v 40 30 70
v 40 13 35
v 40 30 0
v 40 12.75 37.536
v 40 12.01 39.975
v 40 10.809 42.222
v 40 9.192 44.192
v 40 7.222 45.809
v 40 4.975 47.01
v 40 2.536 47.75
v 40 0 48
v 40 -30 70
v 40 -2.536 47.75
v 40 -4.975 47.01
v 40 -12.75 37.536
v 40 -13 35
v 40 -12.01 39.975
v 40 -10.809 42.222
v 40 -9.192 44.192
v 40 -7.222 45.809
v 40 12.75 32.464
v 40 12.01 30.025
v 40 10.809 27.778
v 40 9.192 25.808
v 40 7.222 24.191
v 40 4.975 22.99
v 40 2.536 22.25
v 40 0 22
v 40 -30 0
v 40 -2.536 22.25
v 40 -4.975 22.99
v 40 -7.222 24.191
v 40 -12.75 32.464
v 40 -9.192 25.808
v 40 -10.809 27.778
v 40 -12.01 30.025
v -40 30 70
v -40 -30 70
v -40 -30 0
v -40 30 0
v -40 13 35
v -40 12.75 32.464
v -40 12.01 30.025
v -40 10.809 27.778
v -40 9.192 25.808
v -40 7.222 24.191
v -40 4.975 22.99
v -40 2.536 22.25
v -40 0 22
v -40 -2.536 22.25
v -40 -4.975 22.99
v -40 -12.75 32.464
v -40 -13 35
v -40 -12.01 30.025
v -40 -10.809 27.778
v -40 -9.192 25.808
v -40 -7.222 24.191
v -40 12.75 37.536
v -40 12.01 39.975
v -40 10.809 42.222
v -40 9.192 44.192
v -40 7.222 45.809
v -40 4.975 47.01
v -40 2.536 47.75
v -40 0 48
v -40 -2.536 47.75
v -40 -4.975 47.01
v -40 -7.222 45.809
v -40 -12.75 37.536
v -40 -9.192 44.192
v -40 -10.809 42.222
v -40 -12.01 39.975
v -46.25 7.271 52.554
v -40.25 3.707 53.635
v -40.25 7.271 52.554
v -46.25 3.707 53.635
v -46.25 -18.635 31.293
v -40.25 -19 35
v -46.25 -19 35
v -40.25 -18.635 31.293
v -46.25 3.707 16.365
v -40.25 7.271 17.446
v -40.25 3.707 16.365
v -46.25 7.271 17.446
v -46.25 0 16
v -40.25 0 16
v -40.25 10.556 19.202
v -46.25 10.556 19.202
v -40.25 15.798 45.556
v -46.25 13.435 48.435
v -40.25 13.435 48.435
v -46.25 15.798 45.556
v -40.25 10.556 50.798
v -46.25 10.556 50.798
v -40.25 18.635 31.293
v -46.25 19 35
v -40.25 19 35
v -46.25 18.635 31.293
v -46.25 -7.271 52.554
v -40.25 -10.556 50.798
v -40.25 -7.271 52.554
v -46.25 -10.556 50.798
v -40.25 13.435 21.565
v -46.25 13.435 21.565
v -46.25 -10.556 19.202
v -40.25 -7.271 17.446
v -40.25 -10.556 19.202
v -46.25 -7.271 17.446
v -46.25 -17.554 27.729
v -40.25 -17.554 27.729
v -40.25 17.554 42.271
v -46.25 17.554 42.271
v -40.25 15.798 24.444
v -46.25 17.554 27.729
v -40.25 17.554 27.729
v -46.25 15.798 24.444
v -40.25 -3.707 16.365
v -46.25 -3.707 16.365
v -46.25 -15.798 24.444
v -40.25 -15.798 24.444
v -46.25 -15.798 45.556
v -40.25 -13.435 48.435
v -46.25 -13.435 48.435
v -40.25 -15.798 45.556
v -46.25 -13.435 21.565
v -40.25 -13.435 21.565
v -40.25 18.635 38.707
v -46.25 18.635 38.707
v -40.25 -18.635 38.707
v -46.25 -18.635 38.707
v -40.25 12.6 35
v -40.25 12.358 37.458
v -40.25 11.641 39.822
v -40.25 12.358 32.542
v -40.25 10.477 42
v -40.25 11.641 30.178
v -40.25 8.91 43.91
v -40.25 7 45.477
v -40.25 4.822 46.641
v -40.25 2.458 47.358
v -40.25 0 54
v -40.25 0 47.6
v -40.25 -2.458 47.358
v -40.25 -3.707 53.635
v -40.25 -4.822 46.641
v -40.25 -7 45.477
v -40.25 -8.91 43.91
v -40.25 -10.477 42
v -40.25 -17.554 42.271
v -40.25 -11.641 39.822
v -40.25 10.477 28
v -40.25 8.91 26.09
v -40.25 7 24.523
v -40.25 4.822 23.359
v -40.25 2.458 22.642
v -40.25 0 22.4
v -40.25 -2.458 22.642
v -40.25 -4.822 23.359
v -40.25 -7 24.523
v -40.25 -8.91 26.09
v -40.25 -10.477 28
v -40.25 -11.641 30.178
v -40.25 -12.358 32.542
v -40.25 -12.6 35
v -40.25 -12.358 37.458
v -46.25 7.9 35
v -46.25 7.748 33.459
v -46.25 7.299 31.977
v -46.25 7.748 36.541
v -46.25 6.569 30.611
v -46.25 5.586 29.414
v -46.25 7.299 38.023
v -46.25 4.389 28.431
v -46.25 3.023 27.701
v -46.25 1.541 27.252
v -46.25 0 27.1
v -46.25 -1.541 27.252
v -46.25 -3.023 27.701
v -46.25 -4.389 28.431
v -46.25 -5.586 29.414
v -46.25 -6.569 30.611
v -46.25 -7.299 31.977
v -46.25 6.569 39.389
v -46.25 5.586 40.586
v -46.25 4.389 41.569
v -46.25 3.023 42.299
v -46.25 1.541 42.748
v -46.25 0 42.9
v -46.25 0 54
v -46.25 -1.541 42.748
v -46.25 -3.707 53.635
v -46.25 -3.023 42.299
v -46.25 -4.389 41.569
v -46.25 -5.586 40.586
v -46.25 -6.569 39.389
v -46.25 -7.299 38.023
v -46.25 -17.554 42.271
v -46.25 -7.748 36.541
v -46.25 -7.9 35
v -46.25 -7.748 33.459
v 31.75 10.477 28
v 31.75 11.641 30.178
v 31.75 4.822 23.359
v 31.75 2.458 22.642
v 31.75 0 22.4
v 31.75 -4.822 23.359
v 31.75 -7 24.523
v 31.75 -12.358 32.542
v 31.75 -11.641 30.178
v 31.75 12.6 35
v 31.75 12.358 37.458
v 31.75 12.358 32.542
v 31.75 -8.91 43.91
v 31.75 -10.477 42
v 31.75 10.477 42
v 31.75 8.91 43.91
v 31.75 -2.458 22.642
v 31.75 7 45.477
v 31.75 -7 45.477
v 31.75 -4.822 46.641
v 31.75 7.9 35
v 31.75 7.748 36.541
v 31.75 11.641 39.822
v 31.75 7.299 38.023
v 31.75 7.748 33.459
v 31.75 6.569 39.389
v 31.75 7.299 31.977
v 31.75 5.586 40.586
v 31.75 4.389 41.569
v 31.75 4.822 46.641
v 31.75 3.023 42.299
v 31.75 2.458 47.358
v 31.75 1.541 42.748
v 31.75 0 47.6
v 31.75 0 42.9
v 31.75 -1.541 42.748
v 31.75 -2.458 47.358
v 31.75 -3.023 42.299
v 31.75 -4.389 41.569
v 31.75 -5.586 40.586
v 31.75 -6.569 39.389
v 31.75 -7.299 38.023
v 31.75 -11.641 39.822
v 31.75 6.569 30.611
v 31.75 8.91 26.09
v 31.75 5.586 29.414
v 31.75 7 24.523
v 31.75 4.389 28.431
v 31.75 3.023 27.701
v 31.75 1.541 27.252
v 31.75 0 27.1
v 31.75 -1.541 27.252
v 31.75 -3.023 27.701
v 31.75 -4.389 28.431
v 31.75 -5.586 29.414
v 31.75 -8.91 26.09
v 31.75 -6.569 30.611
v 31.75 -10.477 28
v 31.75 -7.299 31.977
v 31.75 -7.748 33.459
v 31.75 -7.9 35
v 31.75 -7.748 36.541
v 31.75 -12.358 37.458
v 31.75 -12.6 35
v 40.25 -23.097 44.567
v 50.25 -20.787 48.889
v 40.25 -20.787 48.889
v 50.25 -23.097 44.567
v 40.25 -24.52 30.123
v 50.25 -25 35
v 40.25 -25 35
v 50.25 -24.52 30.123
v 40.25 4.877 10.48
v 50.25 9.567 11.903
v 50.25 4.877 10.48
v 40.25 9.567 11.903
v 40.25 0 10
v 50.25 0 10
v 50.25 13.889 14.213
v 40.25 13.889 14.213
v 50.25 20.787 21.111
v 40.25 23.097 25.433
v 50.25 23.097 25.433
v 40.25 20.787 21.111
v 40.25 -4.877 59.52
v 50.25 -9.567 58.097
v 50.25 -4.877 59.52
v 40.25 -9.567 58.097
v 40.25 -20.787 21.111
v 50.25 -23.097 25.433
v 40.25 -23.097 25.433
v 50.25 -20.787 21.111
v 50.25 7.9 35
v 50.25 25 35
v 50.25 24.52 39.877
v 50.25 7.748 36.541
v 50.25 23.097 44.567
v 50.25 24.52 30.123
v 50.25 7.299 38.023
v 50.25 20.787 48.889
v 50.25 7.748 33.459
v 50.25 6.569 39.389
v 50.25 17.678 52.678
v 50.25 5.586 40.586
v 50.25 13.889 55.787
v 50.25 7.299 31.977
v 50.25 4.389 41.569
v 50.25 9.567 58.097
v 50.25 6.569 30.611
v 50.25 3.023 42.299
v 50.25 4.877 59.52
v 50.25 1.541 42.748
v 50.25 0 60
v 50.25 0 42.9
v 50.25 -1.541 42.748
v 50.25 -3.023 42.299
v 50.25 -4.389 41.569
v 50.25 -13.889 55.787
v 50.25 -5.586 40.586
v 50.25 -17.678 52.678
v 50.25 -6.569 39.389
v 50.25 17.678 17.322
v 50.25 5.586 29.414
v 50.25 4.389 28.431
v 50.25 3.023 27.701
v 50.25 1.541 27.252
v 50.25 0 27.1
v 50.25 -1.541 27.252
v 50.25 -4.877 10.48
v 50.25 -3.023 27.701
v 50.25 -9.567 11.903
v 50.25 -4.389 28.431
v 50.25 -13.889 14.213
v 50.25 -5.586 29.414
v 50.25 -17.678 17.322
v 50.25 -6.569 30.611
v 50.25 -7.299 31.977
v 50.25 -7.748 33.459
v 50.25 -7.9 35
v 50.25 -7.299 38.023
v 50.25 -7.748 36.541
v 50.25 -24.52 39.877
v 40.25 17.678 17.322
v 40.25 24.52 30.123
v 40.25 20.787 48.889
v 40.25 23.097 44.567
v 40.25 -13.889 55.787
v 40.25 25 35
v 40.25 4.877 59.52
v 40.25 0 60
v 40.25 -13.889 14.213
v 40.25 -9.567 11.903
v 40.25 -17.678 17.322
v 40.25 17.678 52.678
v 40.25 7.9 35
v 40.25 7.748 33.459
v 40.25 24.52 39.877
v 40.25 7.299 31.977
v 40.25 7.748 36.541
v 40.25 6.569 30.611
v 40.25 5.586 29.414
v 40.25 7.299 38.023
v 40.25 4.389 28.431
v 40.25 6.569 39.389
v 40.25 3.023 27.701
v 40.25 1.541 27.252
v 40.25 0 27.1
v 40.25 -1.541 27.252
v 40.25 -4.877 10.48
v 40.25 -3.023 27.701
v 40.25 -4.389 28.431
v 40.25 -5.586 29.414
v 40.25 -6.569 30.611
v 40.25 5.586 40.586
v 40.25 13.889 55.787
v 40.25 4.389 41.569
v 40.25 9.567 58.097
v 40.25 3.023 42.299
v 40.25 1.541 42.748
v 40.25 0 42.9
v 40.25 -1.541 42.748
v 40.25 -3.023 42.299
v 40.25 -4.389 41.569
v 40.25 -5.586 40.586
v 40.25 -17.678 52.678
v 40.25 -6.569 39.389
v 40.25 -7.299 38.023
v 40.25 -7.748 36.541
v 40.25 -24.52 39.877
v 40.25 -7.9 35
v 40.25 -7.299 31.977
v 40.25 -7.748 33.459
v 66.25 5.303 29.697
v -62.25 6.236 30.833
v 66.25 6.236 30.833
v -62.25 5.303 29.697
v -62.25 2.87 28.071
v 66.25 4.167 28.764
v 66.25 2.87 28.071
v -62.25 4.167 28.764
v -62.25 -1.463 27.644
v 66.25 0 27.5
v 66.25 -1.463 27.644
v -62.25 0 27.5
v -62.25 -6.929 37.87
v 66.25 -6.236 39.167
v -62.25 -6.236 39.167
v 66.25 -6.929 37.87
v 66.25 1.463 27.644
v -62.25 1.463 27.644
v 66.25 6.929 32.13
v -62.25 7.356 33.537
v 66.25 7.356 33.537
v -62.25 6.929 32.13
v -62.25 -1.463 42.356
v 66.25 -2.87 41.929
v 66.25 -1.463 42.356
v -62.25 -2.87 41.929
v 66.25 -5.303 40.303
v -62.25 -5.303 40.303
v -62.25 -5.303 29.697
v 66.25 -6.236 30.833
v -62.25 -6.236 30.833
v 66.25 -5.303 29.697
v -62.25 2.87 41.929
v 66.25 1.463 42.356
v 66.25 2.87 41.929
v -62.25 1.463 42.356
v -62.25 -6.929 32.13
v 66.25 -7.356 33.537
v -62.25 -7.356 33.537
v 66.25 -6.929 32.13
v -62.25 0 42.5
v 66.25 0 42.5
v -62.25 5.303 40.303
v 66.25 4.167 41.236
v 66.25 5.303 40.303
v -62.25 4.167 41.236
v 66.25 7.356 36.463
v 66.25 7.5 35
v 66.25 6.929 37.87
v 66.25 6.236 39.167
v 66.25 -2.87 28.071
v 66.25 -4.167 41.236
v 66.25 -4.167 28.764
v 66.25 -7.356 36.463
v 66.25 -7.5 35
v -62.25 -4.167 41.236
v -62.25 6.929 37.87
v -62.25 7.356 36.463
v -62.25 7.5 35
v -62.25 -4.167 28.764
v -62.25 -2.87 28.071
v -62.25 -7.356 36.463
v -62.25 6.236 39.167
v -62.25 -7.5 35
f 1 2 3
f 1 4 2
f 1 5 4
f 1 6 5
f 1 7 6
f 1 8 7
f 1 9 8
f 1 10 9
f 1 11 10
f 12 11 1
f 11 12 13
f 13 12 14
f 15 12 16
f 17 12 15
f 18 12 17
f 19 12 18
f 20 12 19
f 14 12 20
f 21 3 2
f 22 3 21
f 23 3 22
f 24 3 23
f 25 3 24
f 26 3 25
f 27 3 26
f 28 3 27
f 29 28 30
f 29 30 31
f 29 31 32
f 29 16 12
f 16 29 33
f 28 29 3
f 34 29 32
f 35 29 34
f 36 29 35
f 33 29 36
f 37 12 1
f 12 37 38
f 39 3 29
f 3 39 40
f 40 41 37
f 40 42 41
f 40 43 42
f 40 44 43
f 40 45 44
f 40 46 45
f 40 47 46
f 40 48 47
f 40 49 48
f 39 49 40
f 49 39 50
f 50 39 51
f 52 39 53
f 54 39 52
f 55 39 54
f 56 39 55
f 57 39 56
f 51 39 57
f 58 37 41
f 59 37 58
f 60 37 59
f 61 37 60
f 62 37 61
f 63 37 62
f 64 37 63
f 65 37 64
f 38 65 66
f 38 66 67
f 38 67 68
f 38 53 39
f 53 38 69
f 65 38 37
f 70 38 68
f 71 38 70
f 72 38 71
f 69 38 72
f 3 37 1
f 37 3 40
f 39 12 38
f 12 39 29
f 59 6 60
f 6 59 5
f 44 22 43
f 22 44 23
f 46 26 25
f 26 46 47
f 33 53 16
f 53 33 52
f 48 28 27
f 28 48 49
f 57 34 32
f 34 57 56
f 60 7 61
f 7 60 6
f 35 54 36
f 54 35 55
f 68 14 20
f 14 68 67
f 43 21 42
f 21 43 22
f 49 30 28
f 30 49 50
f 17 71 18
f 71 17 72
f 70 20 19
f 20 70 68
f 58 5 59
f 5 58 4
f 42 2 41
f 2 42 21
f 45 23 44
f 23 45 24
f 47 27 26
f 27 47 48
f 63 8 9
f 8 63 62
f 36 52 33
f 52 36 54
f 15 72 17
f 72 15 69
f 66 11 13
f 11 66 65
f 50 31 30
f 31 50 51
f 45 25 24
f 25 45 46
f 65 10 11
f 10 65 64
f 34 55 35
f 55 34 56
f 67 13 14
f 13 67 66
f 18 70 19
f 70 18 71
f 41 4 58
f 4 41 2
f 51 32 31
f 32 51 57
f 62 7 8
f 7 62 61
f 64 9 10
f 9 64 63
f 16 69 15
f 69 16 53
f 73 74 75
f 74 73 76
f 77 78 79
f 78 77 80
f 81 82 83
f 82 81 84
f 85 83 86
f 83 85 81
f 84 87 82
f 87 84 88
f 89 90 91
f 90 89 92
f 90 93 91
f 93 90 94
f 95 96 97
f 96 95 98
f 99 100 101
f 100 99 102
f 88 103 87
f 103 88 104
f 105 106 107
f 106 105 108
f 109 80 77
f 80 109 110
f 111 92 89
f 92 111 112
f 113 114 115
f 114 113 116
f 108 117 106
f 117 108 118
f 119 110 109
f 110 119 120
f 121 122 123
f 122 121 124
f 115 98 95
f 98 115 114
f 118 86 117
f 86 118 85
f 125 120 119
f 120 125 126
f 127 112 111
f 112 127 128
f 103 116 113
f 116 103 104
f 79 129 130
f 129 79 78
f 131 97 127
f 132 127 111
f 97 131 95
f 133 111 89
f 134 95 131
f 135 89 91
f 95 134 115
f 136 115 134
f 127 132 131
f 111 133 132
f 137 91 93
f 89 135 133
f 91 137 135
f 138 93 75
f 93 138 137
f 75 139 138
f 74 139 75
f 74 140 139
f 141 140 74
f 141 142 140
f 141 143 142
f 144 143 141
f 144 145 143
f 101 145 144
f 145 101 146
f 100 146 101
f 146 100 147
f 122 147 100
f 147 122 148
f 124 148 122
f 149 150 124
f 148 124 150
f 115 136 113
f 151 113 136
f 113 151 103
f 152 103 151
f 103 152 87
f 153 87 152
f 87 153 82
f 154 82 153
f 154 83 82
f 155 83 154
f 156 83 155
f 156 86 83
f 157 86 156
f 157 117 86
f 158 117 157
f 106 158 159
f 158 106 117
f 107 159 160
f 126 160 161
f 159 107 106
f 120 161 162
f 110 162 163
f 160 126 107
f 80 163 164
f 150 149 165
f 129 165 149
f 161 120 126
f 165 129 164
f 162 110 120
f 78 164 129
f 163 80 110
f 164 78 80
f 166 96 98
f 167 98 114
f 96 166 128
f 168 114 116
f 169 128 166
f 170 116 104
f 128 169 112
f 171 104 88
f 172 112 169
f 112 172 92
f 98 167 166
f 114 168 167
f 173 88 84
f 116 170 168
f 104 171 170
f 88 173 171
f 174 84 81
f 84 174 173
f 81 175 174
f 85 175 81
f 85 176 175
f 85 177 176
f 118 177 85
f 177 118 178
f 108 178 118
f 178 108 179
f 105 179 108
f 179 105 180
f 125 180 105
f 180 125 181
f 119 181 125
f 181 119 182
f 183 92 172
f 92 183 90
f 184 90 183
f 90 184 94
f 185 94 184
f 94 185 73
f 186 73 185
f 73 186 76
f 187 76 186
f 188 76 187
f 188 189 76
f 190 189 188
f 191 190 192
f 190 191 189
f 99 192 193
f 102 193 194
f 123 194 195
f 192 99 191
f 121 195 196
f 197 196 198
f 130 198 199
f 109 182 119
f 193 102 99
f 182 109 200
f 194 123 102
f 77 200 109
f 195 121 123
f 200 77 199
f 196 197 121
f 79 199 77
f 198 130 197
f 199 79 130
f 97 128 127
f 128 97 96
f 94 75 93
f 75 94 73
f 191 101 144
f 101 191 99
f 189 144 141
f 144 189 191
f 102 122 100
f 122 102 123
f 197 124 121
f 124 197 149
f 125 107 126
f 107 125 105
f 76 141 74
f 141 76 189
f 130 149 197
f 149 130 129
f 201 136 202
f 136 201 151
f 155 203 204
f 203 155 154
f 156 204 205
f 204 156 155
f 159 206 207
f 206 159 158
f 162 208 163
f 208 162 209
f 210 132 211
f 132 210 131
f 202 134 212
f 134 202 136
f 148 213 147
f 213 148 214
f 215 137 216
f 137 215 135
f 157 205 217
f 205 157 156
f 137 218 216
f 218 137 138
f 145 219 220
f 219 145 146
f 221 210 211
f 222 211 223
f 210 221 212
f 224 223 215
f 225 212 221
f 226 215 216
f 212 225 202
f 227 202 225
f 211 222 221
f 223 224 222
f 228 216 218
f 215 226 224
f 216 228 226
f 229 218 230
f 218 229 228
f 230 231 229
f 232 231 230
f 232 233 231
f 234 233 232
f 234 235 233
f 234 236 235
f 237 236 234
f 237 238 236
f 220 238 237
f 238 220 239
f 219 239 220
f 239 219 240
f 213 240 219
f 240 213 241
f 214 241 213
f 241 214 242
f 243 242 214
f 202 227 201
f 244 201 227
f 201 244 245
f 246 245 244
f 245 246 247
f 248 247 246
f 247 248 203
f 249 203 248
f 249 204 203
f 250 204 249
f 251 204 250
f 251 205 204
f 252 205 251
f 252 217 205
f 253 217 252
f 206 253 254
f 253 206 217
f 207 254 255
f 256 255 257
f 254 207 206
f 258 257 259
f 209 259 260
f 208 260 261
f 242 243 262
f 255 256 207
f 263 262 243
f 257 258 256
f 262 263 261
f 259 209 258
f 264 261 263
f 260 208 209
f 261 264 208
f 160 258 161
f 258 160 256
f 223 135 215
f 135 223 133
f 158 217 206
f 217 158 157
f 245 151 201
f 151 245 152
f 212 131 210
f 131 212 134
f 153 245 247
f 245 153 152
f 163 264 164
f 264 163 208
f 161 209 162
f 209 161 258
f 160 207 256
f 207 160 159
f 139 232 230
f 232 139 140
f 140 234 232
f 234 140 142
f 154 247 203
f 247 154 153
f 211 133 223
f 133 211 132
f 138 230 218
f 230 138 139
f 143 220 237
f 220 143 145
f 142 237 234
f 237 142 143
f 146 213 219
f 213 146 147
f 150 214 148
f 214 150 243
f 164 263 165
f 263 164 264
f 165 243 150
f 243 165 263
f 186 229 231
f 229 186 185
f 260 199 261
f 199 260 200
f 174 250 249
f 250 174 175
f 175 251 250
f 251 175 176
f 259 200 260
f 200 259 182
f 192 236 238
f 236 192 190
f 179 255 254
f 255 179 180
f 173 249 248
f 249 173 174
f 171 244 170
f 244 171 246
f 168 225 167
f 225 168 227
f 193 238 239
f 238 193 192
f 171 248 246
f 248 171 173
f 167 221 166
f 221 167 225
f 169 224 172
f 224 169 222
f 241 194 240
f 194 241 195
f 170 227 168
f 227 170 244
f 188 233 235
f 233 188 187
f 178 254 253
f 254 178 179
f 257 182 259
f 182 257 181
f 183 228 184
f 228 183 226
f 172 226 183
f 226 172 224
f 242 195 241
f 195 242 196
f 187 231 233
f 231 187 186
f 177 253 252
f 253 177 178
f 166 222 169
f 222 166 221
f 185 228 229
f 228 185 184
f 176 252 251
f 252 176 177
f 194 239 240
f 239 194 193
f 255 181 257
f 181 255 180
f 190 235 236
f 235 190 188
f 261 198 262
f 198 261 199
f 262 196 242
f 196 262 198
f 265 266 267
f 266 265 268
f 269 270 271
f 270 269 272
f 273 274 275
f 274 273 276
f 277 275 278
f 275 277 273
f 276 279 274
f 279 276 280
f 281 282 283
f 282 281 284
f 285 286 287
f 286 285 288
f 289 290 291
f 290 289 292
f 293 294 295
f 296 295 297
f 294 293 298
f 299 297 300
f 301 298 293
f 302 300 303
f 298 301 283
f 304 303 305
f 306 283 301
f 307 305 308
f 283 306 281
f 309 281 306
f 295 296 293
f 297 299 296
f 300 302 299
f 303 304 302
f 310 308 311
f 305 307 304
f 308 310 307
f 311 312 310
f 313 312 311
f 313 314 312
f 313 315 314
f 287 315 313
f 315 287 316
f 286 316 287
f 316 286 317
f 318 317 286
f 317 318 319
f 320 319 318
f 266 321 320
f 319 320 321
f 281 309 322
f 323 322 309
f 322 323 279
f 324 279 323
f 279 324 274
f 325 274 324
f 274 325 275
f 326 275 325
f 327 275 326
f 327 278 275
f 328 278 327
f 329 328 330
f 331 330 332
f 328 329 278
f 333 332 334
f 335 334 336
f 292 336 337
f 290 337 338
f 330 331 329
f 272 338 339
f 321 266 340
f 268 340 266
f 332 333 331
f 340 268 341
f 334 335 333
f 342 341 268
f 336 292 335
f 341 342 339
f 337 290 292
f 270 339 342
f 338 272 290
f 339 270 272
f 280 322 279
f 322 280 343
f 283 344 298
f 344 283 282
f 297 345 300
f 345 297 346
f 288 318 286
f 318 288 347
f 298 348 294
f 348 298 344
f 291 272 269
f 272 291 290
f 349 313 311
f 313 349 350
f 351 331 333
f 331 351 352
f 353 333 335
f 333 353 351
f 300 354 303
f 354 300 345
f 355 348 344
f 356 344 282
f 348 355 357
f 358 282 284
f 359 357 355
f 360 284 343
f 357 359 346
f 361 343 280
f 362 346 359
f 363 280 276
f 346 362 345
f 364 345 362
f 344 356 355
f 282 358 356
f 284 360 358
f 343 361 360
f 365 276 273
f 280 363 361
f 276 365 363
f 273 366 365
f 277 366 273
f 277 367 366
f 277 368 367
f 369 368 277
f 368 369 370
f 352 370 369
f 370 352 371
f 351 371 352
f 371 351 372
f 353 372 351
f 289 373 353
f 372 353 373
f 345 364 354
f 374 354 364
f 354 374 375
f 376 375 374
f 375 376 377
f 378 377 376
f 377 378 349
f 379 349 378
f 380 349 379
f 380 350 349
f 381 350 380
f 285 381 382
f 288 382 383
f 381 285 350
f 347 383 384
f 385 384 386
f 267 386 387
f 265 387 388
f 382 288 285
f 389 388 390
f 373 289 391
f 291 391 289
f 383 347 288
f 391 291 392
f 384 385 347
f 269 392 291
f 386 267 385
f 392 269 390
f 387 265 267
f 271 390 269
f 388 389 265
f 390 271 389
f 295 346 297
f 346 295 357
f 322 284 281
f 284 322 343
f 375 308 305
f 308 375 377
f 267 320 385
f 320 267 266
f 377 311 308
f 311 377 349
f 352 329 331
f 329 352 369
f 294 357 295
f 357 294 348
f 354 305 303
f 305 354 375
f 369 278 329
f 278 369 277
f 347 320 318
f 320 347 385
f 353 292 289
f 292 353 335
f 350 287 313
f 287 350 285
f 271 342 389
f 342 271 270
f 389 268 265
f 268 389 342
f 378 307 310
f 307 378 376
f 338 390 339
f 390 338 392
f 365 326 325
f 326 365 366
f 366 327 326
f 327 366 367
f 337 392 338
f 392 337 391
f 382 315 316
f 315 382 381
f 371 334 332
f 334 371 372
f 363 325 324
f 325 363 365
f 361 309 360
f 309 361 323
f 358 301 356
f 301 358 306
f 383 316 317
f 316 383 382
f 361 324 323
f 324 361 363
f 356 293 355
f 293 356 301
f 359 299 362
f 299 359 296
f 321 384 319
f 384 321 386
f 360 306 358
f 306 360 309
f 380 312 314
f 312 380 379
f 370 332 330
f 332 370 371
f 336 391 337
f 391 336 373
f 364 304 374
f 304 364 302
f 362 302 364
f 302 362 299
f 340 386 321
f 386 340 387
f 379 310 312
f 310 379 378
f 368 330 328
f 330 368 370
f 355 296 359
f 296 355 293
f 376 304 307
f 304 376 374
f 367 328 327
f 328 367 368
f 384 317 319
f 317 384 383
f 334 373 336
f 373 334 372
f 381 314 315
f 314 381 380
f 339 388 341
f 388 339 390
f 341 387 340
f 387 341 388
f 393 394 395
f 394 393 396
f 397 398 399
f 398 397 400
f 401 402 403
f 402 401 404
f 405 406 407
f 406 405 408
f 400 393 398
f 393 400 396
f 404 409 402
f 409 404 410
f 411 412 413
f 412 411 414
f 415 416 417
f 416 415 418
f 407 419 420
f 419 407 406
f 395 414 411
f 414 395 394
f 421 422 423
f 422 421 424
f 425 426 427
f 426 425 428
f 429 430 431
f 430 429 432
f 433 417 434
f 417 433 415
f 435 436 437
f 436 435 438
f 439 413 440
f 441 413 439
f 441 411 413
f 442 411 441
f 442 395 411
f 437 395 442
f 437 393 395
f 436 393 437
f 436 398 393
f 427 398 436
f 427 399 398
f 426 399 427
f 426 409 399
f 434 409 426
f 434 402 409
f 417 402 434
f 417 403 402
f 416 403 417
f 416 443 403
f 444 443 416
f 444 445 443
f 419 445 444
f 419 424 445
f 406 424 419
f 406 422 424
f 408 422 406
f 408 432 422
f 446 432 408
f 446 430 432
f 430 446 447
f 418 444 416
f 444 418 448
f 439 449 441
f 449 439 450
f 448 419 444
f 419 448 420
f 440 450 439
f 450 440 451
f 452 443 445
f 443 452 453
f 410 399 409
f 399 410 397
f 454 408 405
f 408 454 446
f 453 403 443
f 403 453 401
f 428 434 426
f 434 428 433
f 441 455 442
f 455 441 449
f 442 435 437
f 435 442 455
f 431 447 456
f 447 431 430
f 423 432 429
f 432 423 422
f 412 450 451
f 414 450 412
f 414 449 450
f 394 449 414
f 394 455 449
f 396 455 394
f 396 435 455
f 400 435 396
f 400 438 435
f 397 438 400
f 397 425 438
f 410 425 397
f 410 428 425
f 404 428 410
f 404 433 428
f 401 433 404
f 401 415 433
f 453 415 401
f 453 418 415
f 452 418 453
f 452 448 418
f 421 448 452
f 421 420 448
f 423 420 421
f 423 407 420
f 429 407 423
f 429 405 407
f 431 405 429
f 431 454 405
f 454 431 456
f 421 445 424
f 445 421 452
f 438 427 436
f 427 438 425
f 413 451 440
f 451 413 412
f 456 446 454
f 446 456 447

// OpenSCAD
$fn = 32;

// ------------------------------------------------------------------------
// Bushed housing: 80 x 60 x 70 mm housing, bushing d25.2
// Every part is its own module, assembly() places them once.
// ------------------------------------------------------------------------

// --- part 1 ---
module housing() {
  difference() {
    translate([-40, -30, 0]) cube([80, 60, 70]);
    translate([0, 0, 35]) rotate([0, 90, 0]) cylinder(h = 82, d = 26, center = true);
  }
}

// --- part 2 ---
module bushing() {
  difference() {
    union() {
      cylinder(h = 6, d = 38);
      translate([0, 0, 6]) cylinder(h = 72, d = 25.2);
    }
    translate([0, 0, -1]) cylinder(h = 80, d = 15.8);
  }
}

// --- part 3 ---
module shaft() {
  translate([0, 0, -64.25]) cylinder(h = 128.5, d = 15);
}

// --- part 4 ---
module cover() {
  difference() {
    cylinder(h = 10, d = 50);
    translate([0, 0, -1]) cylinder(h = 12, d = 15.8);
  }
}

// --- assembly ---
module assembly() {
  translate([0, 0, 0]) rotate([0, 0, 0]) housing();
  translate([-46.25, 0, 35]) rotate([0, 90, 0]) bushing();
  translate([2, 0, 35]) rotate([0, 90, 0]) shaft();
  translate([40.25, 0, 35]) rotate([0, 90, 0]) cover();
}

assembly();
